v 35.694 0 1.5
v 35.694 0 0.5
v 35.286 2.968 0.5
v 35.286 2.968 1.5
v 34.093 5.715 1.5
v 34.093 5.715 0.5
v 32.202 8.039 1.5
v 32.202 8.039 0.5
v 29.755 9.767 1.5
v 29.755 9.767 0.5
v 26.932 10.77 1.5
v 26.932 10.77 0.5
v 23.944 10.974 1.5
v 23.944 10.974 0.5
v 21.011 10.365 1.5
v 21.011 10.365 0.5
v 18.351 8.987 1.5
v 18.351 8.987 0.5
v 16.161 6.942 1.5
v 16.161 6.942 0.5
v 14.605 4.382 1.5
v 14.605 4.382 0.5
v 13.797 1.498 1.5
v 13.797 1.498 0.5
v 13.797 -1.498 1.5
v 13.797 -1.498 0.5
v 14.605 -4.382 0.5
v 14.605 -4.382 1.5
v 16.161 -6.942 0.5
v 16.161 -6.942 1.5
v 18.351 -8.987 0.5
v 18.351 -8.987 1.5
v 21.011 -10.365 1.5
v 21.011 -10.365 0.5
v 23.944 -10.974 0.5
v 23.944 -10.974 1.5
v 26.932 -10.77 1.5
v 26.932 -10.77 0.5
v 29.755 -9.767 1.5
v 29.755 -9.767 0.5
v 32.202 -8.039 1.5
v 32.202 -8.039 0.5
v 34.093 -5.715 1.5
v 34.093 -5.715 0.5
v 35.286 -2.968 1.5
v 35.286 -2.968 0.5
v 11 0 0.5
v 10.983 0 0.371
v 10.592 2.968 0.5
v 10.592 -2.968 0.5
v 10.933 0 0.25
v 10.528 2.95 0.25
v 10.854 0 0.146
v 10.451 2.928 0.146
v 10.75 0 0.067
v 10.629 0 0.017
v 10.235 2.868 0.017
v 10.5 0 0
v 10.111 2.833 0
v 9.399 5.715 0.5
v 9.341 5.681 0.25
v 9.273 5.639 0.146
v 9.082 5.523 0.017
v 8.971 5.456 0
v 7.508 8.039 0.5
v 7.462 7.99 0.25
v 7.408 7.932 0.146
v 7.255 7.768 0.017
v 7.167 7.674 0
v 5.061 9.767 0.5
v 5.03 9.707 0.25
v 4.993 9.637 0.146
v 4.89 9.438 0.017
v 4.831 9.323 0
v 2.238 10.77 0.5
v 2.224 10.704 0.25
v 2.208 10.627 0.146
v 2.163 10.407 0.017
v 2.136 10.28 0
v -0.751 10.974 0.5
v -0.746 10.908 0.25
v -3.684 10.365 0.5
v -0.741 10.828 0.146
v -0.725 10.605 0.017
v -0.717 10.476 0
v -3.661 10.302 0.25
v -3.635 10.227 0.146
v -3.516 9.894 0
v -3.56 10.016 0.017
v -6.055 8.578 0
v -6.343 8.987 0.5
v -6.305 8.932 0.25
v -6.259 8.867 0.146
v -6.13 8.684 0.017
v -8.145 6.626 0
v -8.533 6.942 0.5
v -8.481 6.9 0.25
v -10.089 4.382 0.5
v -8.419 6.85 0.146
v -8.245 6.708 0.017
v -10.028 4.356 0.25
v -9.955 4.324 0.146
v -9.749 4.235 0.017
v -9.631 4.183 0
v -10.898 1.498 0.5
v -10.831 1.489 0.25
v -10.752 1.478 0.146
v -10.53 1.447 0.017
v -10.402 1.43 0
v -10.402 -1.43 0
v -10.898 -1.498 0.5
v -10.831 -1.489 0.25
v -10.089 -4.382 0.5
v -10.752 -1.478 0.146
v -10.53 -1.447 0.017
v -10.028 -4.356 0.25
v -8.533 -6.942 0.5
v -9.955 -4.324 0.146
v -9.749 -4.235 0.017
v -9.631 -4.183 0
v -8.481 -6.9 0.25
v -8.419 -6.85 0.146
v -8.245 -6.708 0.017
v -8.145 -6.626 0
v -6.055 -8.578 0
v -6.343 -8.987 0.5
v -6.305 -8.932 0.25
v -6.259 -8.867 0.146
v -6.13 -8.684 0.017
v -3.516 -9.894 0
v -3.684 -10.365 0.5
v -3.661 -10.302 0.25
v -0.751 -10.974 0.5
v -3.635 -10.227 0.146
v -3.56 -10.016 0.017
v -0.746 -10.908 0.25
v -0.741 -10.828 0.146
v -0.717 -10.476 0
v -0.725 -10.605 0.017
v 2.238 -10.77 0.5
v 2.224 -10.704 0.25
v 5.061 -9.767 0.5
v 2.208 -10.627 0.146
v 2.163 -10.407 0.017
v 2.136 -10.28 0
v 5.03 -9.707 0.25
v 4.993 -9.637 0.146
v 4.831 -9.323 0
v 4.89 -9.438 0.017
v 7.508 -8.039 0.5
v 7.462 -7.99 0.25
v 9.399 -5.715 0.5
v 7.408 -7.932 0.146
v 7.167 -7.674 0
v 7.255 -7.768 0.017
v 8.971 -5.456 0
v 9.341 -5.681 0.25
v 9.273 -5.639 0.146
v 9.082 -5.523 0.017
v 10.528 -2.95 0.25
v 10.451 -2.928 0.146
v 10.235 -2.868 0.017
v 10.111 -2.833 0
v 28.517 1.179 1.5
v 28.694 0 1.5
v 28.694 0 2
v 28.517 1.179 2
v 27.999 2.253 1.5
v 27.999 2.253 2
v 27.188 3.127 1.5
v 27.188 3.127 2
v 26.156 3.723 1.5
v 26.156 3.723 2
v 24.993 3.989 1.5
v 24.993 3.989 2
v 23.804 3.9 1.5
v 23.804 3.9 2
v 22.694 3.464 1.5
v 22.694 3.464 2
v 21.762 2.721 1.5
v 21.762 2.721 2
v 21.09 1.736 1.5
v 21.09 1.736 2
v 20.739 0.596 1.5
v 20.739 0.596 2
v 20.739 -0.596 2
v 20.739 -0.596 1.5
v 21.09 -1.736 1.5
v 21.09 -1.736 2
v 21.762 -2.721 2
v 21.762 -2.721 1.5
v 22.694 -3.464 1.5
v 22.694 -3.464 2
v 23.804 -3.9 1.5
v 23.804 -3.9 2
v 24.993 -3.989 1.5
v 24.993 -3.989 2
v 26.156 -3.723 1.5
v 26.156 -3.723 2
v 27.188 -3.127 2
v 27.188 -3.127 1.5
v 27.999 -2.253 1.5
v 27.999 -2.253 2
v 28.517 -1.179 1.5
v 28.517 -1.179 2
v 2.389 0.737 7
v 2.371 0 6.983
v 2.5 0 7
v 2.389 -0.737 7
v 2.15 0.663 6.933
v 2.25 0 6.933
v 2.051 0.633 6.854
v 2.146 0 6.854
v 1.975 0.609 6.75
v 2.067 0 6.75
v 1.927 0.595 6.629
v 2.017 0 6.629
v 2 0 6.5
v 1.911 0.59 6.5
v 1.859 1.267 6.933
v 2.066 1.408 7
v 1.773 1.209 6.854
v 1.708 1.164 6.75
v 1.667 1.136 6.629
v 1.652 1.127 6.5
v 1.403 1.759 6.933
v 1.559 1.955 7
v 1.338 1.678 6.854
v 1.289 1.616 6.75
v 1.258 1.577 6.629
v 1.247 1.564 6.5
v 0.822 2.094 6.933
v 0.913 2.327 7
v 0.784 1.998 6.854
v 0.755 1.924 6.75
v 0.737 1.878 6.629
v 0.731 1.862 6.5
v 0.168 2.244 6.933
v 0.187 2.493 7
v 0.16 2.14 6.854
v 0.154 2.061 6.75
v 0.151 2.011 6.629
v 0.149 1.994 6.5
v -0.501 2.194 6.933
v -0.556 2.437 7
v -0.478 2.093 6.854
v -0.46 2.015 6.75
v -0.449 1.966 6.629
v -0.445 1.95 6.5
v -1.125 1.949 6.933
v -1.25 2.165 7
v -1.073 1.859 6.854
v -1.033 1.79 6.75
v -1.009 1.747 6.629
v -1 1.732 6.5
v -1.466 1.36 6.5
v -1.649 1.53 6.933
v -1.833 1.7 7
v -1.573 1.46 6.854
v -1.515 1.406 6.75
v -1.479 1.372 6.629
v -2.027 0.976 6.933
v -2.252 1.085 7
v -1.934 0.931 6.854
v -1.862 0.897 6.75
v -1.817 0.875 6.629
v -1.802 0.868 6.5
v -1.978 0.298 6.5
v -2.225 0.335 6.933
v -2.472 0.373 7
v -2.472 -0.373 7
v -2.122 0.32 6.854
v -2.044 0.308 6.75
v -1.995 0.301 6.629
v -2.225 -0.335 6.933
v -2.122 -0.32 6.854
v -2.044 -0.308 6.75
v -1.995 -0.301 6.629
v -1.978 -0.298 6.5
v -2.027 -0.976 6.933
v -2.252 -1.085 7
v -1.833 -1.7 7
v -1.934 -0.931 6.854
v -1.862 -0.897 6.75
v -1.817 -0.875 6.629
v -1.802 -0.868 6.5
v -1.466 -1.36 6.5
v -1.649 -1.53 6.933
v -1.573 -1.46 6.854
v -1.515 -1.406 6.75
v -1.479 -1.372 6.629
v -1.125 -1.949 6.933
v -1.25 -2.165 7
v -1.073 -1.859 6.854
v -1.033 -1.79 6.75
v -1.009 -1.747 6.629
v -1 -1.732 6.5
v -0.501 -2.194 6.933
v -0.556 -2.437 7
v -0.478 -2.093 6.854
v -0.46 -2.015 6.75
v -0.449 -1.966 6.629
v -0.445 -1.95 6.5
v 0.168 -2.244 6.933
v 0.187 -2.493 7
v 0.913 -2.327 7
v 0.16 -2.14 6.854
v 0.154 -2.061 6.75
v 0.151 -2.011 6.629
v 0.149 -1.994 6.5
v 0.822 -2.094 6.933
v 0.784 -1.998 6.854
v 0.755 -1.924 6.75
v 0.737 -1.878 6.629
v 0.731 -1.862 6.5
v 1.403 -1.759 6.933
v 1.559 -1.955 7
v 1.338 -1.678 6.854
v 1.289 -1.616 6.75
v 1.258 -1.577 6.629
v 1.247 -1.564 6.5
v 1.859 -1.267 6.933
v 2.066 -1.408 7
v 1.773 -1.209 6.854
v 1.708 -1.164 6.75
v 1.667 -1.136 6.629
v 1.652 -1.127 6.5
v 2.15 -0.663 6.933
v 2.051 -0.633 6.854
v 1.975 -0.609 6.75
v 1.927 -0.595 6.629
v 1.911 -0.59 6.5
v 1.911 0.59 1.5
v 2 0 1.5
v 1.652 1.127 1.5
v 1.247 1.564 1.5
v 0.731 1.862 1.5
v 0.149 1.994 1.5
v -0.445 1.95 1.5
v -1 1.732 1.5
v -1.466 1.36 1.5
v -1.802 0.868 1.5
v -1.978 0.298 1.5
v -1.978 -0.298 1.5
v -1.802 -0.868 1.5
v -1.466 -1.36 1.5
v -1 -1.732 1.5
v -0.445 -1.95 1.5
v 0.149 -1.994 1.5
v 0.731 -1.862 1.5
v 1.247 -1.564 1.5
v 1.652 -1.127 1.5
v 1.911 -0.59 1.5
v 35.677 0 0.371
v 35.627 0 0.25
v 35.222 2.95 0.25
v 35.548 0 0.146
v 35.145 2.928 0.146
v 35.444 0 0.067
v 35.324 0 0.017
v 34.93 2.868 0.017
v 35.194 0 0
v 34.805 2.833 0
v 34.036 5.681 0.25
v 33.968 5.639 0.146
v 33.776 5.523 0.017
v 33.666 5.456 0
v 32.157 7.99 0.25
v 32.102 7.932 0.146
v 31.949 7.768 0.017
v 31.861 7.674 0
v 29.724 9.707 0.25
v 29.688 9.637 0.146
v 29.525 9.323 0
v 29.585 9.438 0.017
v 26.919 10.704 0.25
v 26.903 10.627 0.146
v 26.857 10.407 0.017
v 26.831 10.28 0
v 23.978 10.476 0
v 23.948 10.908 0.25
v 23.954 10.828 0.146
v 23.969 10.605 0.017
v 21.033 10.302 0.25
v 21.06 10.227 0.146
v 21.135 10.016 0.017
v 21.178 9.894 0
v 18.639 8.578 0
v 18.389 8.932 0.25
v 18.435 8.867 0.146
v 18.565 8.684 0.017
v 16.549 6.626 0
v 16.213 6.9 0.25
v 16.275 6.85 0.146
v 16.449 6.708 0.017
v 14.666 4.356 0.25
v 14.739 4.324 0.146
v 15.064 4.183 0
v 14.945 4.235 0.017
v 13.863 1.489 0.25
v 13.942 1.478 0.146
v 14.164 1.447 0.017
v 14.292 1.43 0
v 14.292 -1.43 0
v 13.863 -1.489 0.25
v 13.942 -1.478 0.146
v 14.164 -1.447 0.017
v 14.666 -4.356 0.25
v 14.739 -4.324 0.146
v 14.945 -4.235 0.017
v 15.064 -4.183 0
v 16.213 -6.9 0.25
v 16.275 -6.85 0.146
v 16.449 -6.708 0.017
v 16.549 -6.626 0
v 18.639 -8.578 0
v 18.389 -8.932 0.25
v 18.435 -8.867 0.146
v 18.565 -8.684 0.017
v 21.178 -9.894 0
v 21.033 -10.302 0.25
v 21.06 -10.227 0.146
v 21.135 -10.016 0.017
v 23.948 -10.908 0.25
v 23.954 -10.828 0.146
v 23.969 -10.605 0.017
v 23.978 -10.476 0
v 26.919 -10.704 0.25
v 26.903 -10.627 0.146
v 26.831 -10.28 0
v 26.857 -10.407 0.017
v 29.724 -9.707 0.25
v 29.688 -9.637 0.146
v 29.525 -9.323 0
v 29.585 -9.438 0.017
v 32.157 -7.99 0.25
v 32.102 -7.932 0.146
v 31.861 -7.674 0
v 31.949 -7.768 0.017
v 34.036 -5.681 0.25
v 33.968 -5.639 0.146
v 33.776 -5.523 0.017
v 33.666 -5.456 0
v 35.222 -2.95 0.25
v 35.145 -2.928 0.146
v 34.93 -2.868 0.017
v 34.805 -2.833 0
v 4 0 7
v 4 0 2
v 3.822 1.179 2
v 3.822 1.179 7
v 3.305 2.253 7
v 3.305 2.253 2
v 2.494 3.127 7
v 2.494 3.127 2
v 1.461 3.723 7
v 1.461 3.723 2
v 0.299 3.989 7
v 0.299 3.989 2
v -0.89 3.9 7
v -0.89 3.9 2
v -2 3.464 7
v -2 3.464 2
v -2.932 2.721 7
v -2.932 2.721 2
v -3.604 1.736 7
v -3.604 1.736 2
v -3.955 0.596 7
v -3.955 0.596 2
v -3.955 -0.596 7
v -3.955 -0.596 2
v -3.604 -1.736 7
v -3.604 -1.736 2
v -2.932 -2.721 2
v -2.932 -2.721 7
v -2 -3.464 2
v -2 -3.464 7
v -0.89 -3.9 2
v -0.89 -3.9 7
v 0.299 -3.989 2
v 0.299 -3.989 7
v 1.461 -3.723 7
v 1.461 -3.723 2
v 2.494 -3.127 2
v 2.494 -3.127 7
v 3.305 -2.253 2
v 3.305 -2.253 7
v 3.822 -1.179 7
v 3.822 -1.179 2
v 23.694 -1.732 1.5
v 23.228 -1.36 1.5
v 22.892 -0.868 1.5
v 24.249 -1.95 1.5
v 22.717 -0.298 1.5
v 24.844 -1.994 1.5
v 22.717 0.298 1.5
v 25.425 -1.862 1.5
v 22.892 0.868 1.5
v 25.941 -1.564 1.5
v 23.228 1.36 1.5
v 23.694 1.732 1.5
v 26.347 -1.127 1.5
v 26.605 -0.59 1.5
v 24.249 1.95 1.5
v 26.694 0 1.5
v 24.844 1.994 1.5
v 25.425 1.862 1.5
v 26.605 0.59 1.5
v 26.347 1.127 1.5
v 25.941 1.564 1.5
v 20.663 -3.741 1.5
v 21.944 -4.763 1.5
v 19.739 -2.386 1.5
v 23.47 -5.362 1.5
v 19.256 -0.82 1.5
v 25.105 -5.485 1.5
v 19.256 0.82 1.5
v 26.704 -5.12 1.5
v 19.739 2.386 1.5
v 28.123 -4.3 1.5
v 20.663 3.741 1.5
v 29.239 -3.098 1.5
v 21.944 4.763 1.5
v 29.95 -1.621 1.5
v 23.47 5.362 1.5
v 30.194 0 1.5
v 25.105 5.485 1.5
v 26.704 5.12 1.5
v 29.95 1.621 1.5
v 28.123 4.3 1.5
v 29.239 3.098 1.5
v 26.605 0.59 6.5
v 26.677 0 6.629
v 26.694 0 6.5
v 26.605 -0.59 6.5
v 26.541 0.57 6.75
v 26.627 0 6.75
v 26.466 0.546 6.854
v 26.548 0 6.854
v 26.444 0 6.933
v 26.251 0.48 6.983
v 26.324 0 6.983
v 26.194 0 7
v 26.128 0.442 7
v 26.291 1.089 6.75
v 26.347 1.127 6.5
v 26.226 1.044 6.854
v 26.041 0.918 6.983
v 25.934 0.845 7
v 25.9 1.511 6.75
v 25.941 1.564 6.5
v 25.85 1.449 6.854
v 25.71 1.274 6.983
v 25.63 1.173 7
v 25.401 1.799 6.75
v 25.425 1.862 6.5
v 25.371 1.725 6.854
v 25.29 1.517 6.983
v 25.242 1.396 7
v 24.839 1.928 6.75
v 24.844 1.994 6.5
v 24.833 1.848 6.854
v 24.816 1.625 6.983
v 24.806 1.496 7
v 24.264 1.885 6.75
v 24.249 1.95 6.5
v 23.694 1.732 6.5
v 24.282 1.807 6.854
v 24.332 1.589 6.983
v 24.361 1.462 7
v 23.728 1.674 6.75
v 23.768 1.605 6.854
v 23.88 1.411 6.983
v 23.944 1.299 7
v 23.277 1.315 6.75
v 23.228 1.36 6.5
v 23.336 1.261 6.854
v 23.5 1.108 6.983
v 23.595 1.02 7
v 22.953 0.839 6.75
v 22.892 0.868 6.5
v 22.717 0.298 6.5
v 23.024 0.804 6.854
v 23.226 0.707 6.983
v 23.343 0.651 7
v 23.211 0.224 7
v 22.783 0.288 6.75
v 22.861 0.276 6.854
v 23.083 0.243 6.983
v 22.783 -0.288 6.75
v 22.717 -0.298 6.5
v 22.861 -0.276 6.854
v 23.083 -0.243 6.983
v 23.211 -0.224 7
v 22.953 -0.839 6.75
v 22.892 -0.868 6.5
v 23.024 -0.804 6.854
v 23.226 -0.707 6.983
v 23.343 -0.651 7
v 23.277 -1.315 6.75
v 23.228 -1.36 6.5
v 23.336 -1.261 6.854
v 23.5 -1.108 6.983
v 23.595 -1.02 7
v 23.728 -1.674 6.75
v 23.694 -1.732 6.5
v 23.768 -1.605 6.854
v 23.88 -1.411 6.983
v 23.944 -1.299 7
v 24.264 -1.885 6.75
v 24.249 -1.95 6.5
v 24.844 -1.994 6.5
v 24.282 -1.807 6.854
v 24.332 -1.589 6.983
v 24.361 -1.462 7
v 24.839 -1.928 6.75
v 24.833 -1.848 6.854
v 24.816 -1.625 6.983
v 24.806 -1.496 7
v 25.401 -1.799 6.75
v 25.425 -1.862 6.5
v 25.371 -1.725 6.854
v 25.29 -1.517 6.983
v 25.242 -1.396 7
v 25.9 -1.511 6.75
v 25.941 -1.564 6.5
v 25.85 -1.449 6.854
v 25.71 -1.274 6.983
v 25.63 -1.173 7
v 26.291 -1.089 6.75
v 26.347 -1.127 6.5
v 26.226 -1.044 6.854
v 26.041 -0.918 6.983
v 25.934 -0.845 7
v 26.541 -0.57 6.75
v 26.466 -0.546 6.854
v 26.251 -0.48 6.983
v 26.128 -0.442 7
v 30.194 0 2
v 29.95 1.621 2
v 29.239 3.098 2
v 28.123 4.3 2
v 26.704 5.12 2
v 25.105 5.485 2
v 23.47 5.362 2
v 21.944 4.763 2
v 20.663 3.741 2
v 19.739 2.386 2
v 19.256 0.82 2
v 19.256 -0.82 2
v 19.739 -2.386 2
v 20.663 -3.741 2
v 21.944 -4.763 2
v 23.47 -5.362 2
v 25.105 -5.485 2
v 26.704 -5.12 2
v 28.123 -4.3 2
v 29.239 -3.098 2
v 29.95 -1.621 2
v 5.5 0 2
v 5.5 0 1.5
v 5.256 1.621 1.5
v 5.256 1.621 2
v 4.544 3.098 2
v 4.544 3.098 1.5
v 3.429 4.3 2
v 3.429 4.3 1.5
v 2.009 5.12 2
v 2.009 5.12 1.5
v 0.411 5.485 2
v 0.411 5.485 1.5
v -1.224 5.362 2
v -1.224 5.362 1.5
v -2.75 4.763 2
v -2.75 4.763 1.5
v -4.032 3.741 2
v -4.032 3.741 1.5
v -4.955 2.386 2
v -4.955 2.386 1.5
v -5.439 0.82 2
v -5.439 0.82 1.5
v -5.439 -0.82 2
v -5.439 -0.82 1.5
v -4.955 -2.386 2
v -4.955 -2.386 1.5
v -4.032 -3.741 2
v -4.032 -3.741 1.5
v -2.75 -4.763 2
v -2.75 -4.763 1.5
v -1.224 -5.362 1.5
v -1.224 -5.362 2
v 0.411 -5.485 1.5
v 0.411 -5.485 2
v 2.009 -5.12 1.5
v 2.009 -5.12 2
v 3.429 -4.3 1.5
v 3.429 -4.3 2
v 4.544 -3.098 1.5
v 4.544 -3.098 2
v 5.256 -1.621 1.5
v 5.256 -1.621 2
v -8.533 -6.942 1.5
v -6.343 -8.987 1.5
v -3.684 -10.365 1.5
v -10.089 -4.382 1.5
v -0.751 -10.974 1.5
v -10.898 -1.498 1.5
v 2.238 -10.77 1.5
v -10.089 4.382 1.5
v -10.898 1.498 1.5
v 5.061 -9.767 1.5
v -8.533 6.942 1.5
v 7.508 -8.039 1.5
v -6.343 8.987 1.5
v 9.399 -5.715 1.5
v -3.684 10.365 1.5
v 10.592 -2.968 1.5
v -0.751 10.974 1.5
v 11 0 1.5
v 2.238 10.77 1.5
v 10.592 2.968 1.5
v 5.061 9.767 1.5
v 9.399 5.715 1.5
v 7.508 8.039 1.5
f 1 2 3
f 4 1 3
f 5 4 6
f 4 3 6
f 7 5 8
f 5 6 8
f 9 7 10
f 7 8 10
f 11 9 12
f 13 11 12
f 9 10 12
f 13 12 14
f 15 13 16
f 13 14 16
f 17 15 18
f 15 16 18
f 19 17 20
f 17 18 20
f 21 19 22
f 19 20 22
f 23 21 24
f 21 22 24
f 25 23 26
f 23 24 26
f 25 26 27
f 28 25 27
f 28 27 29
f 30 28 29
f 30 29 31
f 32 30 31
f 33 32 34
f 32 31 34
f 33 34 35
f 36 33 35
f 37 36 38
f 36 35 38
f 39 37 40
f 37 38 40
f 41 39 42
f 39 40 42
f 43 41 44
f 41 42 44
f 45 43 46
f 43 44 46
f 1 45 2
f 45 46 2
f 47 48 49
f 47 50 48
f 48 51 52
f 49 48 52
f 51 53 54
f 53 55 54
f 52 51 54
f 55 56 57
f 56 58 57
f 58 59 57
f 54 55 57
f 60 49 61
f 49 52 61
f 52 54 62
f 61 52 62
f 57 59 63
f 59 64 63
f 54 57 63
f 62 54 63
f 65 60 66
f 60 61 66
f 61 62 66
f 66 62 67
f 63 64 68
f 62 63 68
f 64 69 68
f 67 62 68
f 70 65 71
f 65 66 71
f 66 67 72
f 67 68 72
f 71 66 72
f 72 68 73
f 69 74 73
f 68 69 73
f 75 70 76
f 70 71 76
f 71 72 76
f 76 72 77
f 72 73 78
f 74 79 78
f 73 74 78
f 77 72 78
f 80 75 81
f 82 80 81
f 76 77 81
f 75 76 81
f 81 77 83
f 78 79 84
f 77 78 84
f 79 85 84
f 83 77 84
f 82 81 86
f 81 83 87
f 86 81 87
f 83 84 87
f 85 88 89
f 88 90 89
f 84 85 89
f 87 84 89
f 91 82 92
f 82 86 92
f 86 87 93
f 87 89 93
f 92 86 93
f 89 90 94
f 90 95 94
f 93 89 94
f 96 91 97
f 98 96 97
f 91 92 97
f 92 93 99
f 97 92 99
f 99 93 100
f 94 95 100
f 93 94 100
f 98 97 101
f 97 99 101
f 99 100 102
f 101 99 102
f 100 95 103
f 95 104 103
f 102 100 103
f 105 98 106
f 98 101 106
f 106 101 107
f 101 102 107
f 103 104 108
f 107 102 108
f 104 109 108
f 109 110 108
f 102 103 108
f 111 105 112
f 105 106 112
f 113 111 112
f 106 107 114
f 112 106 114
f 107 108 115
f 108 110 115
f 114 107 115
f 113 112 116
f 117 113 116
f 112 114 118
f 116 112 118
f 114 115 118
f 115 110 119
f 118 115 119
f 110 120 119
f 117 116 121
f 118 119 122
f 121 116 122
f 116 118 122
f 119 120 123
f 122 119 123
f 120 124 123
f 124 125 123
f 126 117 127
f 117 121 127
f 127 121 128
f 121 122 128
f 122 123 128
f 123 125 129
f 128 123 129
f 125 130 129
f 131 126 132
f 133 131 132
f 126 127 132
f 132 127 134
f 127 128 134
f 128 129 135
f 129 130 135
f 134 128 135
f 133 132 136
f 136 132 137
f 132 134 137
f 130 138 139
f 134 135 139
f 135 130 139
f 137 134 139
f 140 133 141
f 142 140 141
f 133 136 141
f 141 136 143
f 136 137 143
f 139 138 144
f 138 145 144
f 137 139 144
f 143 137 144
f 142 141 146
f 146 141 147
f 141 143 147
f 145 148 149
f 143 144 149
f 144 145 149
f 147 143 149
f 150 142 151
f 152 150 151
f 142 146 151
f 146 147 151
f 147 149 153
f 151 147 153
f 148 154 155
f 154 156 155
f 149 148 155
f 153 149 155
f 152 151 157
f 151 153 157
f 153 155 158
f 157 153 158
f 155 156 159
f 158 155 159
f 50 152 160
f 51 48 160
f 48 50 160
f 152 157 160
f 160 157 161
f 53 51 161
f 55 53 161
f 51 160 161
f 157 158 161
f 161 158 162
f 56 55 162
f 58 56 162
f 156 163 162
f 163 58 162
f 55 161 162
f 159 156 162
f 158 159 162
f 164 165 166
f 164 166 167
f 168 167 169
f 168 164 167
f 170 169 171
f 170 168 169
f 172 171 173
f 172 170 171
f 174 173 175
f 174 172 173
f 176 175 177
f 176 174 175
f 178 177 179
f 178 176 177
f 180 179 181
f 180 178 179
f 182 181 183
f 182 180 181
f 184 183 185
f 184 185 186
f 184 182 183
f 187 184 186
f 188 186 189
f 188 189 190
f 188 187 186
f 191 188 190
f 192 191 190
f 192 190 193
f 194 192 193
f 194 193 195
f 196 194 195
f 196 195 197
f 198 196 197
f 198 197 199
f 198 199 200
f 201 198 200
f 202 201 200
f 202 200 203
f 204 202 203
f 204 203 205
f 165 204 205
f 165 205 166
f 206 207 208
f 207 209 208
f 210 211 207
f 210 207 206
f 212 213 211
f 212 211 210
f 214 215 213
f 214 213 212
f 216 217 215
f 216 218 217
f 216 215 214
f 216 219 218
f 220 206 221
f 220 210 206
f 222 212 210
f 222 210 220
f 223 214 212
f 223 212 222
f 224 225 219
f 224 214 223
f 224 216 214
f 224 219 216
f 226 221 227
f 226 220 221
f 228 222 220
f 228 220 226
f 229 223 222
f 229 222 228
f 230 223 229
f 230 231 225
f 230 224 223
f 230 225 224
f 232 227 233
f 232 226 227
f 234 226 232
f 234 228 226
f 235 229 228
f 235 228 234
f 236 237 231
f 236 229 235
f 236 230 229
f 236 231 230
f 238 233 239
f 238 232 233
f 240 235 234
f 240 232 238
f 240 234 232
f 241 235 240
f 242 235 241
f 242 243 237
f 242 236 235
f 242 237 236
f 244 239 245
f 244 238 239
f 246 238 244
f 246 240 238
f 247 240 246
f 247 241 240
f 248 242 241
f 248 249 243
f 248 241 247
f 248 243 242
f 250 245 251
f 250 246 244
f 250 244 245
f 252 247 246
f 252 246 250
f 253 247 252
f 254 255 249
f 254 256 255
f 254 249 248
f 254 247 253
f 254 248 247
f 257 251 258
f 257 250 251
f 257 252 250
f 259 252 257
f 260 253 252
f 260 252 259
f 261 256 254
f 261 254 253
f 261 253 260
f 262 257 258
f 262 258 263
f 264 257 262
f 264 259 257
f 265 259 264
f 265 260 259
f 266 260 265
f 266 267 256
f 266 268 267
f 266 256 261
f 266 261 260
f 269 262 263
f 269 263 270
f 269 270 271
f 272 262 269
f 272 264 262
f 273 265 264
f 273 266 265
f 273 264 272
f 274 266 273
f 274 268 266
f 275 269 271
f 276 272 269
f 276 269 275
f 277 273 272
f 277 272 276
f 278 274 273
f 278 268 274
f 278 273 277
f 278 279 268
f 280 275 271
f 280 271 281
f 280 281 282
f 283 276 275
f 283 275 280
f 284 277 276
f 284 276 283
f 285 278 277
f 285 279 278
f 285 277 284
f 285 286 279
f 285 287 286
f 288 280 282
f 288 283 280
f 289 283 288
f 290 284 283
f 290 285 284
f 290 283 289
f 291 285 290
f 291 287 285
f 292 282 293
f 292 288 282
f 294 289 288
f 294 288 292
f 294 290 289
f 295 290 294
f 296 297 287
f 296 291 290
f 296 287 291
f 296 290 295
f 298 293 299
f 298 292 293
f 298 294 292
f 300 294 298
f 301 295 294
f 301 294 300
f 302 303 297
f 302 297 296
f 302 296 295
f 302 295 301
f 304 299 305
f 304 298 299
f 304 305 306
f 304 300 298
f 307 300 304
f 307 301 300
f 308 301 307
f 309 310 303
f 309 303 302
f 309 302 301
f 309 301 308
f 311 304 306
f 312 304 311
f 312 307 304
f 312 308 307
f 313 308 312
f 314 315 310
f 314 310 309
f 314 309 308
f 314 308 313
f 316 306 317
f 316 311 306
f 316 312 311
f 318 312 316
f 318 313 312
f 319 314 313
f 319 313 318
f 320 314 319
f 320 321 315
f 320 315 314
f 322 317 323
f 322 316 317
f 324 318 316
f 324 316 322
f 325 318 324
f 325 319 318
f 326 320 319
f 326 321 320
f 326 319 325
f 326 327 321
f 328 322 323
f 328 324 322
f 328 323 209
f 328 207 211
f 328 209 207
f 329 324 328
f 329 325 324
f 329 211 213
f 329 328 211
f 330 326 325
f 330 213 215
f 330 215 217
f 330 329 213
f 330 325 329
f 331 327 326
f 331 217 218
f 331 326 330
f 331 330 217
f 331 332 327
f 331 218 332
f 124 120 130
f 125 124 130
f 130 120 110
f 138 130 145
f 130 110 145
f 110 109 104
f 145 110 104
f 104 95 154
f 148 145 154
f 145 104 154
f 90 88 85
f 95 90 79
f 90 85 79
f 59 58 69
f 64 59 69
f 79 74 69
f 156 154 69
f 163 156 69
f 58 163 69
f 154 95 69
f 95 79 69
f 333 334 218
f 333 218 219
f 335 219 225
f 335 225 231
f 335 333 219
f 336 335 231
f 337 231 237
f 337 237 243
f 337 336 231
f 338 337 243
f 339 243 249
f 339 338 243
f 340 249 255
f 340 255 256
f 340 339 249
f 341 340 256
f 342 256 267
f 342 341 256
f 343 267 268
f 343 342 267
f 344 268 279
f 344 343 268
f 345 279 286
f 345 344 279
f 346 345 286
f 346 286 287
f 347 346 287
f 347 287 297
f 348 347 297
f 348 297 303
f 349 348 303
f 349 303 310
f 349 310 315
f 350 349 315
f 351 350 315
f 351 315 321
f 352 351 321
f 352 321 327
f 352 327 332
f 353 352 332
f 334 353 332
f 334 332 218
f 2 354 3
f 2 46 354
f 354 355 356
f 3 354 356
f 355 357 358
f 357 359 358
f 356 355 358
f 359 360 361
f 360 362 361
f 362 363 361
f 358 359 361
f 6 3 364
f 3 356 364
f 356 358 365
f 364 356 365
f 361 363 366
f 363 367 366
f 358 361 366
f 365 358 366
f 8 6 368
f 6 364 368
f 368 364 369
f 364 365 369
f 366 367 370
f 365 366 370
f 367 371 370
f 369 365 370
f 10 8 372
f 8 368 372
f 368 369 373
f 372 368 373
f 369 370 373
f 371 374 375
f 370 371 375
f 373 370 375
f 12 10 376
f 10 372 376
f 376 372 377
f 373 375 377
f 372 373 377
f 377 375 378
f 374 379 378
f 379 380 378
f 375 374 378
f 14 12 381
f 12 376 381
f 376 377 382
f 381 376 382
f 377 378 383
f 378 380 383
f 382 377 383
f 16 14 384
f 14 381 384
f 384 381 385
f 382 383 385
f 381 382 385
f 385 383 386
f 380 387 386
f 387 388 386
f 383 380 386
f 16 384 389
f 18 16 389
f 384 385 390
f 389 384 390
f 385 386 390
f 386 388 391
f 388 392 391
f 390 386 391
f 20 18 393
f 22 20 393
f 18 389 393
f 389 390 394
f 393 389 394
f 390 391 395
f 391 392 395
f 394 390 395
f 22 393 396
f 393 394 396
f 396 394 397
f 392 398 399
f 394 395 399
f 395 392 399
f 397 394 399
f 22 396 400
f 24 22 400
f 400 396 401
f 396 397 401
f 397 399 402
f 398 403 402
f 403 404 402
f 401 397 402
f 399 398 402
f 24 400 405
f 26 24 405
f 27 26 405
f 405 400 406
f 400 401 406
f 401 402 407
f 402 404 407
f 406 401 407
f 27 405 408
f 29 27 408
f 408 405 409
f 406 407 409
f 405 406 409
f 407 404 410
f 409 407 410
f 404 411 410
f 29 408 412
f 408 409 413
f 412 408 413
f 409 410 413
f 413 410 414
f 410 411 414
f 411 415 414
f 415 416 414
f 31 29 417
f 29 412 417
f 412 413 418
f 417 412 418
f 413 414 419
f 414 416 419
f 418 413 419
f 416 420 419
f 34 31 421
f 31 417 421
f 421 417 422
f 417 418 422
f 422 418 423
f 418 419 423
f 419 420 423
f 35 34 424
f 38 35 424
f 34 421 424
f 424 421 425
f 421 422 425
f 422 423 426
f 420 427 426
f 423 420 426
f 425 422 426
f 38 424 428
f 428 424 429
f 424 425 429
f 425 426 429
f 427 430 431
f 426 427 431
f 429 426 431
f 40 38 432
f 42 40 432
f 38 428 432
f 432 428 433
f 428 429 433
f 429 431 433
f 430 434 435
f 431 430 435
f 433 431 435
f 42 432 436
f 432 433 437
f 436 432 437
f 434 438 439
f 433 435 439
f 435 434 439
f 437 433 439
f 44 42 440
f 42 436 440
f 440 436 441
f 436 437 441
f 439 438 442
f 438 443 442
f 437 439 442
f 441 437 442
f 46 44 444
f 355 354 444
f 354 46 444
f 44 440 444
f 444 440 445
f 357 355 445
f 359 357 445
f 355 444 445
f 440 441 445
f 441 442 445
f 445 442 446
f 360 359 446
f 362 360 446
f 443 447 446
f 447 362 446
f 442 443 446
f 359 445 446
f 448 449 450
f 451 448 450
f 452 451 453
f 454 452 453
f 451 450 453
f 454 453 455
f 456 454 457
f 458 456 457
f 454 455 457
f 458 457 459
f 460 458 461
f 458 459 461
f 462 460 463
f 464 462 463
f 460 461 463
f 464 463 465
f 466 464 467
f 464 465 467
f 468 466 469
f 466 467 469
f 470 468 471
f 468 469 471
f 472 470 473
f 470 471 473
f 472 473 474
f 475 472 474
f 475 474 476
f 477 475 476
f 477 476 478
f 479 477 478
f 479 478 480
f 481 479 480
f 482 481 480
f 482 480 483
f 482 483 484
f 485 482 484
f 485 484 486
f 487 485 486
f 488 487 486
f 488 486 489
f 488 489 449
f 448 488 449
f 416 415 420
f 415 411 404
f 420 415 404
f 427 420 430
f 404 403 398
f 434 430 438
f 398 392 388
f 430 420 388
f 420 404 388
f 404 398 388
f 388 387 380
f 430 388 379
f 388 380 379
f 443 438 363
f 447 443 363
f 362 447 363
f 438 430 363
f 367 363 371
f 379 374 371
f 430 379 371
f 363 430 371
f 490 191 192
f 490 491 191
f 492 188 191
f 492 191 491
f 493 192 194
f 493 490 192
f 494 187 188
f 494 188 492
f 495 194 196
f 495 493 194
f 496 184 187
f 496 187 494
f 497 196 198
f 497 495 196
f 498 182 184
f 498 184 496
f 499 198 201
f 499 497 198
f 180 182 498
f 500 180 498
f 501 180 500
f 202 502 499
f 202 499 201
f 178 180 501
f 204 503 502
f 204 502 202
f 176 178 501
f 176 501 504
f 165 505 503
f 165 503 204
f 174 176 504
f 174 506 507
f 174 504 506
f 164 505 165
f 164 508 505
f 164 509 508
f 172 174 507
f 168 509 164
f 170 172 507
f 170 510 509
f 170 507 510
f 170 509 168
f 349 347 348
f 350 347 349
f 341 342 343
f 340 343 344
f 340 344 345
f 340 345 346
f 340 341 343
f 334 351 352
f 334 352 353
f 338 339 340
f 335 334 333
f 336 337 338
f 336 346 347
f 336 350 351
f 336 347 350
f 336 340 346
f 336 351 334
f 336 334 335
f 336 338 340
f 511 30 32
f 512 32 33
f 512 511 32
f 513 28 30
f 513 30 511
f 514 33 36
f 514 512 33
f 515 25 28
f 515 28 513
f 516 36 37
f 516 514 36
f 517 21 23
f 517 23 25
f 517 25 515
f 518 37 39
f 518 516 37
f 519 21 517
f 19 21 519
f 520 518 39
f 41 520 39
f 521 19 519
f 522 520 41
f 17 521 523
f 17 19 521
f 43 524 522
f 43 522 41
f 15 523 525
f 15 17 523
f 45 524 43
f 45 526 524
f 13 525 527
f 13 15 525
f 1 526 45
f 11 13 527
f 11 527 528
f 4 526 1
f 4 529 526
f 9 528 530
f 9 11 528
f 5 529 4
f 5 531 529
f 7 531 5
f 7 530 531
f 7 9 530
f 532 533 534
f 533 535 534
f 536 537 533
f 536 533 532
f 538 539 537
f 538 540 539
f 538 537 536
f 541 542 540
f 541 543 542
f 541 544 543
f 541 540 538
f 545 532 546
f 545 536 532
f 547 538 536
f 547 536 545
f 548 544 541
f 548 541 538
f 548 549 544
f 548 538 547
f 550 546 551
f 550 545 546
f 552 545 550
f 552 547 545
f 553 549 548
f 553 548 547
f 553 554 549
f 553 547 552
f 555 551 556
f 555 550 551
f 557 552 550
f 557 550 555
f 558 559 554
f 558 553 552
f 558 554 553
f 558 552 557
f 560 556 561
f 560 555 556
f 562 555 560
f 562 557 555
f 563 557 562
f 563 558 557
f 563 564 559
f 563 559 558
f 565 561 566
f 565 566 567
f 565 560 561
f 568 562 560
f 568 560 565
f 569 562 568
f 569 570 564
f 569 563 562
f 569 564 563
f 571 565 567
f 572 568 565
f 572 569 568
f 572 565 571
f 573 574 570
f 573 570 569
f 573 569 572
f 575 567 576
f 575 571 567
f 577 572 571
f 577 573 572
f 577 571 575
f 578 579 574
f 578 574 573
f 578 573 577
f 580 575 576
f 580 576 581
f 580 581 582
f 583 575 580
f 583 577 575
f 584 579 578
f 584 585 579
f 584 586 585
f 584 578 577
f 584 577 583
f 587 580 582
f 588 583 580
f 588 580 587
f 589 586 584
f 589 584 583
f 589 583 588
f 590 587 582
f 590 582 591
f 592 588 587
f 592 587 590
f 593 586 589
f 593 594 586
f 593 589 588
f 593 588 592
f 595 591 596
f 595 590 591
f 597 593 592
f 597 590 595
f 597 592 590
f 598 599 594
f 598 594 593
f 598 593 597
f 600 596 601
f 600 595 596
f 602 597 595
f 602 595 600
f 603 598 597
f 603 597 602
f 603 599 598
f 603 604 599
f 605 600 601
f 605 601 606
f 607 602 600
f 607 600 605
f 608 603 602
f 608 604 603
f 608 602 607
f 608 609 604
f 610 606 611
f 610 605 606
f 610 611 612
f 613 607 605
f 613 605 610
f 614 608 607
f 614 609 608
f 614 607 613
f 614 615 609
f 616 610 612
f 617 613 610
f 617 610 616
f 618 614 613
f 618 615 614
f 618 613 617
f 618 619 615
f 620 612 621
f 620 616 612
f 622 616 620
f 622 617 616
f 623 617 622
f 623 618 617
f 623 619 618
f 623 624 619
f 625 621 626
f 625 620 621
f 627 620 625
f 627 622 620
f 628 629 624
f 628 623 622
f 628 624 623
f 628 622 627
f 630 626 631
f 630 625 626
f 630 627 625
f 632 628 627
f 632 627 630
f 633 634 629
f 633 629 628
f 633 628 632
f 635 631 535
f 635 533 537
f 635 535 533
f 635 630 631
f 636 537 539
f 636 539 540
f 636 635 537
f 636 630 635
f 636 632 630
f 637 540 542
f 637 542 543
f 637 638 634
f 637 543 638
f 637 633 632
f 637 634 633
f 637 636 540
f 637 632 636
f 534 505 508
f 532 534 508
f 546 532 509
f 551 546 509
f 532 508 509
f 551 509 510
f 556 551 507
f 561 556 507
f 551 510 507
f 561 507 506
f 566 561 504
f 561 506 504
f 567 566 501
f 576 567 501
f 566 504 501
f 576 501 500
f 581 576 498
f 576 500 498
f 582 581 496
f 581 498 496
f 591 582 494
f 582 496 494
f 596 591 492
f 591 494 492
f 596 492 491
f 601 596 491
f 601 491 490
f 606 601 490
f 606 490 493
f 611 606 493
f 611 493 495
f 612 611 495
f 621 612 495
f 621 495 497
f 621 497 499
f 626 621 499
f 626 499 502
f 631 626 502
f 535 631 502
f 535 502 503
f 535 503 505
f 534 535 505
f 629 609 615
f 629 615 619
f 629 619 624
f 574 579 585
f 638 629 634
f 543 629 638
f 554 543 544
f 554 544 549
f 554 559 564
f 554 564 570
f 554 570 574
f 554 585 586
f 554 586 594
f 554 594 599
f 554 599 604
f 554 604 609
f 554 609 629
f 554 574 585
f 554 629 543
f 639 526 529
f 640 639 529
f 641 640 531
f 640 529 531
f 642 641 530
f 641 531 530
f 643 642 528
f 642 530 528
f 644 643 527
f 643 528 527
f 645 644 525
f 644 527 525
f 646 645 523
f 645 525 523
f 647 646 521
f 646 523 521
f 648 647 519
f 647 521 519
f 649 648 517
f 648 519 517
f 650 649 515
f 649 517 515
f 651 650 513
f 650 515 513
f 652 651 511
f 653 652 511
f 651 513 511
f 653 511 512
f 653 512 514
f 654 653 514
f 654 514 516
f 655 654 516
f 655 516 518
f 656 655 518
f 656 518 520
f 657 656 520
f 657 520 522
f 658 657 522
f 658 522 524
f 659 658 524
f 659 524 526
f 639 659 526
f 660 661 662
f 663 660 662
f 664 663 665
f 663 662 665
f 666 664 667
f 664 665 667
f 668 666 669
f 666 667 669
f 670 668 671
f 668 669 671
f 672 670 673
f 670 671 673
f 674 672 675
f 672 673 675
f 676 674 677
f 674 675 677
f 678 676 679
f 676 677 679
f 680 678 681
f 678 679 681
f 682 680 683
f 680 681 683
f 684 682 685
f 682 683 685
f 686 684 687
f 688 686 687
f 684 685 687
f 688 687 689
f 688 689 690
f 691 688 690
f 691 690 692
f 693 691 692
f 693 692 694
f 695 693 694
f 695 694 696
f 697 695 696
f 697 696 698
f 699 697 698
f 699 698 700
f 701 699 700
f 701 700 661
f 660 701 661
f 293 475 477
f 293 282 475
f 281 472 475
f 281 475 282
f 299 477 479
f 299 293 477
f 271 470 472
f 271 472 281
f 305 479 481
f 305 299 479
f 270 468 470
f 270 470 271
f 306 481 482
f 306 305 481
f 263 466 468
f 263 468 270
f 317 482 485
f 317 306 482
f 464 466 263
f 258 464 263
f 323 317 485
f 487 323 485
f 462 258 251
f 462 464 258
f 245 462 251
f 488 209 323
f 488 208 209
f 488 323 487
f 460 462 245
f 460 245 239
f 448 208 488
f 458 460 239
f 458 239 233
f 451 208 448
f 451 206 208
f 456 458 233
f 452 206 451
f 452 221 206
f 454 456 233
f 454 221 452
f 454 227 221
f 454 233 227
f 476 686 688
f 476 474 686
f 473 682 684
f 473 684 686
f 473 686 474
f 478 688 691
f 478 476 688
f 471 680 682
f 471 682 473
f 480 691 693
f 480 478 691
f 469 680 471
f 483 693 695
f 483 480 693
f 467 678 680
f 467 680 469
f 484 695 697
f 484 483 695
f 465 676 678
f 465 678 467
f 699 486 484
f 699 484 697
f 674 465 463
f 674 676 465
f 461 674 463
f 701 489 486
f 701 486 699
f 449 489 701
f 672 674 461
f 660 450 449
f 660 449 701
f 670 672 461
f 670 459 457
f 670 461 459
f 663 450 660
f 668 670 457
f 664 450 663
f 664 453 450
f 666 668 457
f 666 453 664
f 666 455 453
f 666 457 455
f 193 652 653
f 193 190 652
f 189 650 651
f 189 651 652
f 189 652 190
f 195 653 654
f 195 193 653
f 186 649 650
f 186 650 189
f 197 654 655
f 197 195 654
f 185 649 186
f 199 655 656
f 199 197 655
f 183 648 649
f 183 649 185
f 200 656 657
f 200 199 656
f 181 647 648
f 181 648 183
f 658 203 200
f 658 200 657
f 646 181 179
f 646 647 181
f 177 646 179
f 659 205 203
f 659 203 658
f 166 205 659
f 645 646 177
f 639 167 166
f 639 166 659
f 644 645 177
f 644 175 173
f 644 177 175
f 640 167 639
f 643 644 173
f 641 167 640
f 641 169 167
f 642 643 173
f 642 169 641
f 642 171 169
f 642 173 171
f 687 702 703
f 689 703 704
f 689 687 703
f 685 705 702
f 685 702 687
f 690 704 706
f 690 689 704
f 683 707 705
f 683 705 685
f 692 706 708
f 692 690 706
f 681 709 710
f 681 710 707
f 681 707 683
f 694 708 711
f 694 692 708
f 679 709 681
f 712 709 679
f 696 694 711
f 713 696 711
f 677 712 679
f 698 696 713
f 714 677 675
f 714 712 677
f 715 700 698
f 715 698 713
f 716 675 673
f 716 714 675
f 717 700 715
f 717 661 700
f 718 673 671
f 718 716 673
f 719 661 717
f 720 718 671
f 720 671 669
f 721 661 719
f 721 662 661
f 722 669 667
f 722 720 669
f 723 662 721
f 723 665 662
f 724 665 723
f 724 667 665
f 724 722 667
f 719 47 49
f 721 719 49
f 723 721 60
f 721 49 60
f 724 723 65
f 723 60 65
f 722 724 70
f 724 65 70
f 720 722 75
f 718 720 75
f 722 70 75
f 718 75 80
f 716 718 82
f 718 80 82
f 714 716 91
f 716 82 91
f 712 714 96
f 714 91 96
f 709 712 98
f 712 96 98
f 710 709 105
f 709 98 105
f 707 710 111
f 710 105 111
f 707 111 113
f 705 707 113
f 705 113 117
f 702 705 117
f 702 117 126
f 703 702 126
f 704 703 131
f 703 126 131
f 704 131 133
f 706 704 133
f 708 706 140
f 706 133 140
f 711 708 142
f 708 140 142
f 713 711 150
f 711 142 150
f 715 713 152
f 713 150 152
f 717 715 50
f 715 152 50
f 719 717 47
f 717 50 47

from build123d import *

# Parameters (mm, degrees)
F0_R     = 11
F0_R_2   = 5.5
F1_DEPTH = 1.5
F0_R_3   = 4
F2_DEPTH = 2
F0_R_4   = 2
F3_DEPTH = 7
F4_DEPTH = 1.5
F5_R     = 0.5
F5_2_R   = 0.5
F6_R     = 0.5
F6_2_R   = 0.5


with BuildPart() as f1:
    # F0 (on Top) → F1 (new body)
    with BuildSketch(Plane.XY):
        Circle(F0_R)
        Circle(F0_R_2, mode=Mode.SUBTRACT)
    extrude(amount=F1_DEPTH)

    # F0 (on Top) → F2 (join)
    with BuildSketch(Plane.XY):
        Circle(F0_R_2)
        Circle(F0_R_3, mode=Mode.SUBTRACT)
    extrude(amount=F2_DEPTH)

    # F0 (on Top) → F3 (join)
    with BuildSketch(Plane.XY):
        Circle(F0_R_3)
        Circle(F0_R_4, mode=Mode.SUBTRACT)
    extrude(amount=F3_DEPTH)

    # F0 (on Top) → F4 (join)
    with BuildSketch(Plane.XY):
        Circle(F0_R_4)
    extrude(amount=F4_DEPTH)

    # F5
    f5_edges = [f1.edges().sort_by_distance(p)[0] for p in [
        (-2, 0, 7),
    ]]
    fillet(f5_edges, radius=F5_R)

    # F6#2
    f6_2_edges = [f1.edges().sort_by_distance(p)[0] for p in [
        (-11, 0, 0),
    ]]
    fillet(f6_2_edges, radius=F6_2_R)


with BuildPart() as f1b:
    # F0 (on Top) → F1, piece 2 (new body)
    with BuildSketch(Plane.XY):
        with Locations((24.6943037211, 0)):
            Circle(F0_R)
        with Locations((24.6943037211, 0)):
            Circle(F0_R_2, mode=Mode.SUBTRACT)
    extrude(amount=F1_DEPTH)

    # F0 (on Top) → F2, piece 2 (join)
    with BuildSketch(Plane.XY):
        with Locations((24.6943037211, 0)):
            Circle(F0_R_2)
        with Locations((24.6943037211, 0)):
            Circle(F0_R_3, mode=Mode.SUBTRACT)
    extrude(amount=F2_DEPTH)



with BuildPart() as f3:
    # F0 (on Top) → F3, piece 2 (new body)
    with BuildSketch(Plane.XY):
        with Locations((24.6943037211, 0)):
            Circle(F0_R_4)
    extrude(amount=F3_DEPTH)


with BuildPart() as f1b_1:
    add(f1b.part)

    add(f3.part)  # F4#2 merges F3
    # F0 (on Top) → F4, piece 2 (join)
    with BuildSketch(Plane.XY):
        with Locations((24.6943037211, 0)):
            Circle(F0_R_3)
        with Locations((24.6943037211, 0)):
            Circle(F0_R_4, mode=Mode.SUBTRACT)
    extrude(amount=F4_DEPTH)

    # F5#2
    f5_2_edges = [f1b_1.edges().sort_by_distance(p)[0] for p in [
        (22.694304, 0, 7),
    ]]
    fillet(f5_2_edges, radius=F5_2_R)

    # F6
    f6_edges = [f1b_1.edges().sort_by_distance(p)[0] for p in [
        (13.694304, 0, 0),
    ]]
    fillet(f6_edges, radius=F6_R)


solid = Compound([f1.part, f1b_1.part])
